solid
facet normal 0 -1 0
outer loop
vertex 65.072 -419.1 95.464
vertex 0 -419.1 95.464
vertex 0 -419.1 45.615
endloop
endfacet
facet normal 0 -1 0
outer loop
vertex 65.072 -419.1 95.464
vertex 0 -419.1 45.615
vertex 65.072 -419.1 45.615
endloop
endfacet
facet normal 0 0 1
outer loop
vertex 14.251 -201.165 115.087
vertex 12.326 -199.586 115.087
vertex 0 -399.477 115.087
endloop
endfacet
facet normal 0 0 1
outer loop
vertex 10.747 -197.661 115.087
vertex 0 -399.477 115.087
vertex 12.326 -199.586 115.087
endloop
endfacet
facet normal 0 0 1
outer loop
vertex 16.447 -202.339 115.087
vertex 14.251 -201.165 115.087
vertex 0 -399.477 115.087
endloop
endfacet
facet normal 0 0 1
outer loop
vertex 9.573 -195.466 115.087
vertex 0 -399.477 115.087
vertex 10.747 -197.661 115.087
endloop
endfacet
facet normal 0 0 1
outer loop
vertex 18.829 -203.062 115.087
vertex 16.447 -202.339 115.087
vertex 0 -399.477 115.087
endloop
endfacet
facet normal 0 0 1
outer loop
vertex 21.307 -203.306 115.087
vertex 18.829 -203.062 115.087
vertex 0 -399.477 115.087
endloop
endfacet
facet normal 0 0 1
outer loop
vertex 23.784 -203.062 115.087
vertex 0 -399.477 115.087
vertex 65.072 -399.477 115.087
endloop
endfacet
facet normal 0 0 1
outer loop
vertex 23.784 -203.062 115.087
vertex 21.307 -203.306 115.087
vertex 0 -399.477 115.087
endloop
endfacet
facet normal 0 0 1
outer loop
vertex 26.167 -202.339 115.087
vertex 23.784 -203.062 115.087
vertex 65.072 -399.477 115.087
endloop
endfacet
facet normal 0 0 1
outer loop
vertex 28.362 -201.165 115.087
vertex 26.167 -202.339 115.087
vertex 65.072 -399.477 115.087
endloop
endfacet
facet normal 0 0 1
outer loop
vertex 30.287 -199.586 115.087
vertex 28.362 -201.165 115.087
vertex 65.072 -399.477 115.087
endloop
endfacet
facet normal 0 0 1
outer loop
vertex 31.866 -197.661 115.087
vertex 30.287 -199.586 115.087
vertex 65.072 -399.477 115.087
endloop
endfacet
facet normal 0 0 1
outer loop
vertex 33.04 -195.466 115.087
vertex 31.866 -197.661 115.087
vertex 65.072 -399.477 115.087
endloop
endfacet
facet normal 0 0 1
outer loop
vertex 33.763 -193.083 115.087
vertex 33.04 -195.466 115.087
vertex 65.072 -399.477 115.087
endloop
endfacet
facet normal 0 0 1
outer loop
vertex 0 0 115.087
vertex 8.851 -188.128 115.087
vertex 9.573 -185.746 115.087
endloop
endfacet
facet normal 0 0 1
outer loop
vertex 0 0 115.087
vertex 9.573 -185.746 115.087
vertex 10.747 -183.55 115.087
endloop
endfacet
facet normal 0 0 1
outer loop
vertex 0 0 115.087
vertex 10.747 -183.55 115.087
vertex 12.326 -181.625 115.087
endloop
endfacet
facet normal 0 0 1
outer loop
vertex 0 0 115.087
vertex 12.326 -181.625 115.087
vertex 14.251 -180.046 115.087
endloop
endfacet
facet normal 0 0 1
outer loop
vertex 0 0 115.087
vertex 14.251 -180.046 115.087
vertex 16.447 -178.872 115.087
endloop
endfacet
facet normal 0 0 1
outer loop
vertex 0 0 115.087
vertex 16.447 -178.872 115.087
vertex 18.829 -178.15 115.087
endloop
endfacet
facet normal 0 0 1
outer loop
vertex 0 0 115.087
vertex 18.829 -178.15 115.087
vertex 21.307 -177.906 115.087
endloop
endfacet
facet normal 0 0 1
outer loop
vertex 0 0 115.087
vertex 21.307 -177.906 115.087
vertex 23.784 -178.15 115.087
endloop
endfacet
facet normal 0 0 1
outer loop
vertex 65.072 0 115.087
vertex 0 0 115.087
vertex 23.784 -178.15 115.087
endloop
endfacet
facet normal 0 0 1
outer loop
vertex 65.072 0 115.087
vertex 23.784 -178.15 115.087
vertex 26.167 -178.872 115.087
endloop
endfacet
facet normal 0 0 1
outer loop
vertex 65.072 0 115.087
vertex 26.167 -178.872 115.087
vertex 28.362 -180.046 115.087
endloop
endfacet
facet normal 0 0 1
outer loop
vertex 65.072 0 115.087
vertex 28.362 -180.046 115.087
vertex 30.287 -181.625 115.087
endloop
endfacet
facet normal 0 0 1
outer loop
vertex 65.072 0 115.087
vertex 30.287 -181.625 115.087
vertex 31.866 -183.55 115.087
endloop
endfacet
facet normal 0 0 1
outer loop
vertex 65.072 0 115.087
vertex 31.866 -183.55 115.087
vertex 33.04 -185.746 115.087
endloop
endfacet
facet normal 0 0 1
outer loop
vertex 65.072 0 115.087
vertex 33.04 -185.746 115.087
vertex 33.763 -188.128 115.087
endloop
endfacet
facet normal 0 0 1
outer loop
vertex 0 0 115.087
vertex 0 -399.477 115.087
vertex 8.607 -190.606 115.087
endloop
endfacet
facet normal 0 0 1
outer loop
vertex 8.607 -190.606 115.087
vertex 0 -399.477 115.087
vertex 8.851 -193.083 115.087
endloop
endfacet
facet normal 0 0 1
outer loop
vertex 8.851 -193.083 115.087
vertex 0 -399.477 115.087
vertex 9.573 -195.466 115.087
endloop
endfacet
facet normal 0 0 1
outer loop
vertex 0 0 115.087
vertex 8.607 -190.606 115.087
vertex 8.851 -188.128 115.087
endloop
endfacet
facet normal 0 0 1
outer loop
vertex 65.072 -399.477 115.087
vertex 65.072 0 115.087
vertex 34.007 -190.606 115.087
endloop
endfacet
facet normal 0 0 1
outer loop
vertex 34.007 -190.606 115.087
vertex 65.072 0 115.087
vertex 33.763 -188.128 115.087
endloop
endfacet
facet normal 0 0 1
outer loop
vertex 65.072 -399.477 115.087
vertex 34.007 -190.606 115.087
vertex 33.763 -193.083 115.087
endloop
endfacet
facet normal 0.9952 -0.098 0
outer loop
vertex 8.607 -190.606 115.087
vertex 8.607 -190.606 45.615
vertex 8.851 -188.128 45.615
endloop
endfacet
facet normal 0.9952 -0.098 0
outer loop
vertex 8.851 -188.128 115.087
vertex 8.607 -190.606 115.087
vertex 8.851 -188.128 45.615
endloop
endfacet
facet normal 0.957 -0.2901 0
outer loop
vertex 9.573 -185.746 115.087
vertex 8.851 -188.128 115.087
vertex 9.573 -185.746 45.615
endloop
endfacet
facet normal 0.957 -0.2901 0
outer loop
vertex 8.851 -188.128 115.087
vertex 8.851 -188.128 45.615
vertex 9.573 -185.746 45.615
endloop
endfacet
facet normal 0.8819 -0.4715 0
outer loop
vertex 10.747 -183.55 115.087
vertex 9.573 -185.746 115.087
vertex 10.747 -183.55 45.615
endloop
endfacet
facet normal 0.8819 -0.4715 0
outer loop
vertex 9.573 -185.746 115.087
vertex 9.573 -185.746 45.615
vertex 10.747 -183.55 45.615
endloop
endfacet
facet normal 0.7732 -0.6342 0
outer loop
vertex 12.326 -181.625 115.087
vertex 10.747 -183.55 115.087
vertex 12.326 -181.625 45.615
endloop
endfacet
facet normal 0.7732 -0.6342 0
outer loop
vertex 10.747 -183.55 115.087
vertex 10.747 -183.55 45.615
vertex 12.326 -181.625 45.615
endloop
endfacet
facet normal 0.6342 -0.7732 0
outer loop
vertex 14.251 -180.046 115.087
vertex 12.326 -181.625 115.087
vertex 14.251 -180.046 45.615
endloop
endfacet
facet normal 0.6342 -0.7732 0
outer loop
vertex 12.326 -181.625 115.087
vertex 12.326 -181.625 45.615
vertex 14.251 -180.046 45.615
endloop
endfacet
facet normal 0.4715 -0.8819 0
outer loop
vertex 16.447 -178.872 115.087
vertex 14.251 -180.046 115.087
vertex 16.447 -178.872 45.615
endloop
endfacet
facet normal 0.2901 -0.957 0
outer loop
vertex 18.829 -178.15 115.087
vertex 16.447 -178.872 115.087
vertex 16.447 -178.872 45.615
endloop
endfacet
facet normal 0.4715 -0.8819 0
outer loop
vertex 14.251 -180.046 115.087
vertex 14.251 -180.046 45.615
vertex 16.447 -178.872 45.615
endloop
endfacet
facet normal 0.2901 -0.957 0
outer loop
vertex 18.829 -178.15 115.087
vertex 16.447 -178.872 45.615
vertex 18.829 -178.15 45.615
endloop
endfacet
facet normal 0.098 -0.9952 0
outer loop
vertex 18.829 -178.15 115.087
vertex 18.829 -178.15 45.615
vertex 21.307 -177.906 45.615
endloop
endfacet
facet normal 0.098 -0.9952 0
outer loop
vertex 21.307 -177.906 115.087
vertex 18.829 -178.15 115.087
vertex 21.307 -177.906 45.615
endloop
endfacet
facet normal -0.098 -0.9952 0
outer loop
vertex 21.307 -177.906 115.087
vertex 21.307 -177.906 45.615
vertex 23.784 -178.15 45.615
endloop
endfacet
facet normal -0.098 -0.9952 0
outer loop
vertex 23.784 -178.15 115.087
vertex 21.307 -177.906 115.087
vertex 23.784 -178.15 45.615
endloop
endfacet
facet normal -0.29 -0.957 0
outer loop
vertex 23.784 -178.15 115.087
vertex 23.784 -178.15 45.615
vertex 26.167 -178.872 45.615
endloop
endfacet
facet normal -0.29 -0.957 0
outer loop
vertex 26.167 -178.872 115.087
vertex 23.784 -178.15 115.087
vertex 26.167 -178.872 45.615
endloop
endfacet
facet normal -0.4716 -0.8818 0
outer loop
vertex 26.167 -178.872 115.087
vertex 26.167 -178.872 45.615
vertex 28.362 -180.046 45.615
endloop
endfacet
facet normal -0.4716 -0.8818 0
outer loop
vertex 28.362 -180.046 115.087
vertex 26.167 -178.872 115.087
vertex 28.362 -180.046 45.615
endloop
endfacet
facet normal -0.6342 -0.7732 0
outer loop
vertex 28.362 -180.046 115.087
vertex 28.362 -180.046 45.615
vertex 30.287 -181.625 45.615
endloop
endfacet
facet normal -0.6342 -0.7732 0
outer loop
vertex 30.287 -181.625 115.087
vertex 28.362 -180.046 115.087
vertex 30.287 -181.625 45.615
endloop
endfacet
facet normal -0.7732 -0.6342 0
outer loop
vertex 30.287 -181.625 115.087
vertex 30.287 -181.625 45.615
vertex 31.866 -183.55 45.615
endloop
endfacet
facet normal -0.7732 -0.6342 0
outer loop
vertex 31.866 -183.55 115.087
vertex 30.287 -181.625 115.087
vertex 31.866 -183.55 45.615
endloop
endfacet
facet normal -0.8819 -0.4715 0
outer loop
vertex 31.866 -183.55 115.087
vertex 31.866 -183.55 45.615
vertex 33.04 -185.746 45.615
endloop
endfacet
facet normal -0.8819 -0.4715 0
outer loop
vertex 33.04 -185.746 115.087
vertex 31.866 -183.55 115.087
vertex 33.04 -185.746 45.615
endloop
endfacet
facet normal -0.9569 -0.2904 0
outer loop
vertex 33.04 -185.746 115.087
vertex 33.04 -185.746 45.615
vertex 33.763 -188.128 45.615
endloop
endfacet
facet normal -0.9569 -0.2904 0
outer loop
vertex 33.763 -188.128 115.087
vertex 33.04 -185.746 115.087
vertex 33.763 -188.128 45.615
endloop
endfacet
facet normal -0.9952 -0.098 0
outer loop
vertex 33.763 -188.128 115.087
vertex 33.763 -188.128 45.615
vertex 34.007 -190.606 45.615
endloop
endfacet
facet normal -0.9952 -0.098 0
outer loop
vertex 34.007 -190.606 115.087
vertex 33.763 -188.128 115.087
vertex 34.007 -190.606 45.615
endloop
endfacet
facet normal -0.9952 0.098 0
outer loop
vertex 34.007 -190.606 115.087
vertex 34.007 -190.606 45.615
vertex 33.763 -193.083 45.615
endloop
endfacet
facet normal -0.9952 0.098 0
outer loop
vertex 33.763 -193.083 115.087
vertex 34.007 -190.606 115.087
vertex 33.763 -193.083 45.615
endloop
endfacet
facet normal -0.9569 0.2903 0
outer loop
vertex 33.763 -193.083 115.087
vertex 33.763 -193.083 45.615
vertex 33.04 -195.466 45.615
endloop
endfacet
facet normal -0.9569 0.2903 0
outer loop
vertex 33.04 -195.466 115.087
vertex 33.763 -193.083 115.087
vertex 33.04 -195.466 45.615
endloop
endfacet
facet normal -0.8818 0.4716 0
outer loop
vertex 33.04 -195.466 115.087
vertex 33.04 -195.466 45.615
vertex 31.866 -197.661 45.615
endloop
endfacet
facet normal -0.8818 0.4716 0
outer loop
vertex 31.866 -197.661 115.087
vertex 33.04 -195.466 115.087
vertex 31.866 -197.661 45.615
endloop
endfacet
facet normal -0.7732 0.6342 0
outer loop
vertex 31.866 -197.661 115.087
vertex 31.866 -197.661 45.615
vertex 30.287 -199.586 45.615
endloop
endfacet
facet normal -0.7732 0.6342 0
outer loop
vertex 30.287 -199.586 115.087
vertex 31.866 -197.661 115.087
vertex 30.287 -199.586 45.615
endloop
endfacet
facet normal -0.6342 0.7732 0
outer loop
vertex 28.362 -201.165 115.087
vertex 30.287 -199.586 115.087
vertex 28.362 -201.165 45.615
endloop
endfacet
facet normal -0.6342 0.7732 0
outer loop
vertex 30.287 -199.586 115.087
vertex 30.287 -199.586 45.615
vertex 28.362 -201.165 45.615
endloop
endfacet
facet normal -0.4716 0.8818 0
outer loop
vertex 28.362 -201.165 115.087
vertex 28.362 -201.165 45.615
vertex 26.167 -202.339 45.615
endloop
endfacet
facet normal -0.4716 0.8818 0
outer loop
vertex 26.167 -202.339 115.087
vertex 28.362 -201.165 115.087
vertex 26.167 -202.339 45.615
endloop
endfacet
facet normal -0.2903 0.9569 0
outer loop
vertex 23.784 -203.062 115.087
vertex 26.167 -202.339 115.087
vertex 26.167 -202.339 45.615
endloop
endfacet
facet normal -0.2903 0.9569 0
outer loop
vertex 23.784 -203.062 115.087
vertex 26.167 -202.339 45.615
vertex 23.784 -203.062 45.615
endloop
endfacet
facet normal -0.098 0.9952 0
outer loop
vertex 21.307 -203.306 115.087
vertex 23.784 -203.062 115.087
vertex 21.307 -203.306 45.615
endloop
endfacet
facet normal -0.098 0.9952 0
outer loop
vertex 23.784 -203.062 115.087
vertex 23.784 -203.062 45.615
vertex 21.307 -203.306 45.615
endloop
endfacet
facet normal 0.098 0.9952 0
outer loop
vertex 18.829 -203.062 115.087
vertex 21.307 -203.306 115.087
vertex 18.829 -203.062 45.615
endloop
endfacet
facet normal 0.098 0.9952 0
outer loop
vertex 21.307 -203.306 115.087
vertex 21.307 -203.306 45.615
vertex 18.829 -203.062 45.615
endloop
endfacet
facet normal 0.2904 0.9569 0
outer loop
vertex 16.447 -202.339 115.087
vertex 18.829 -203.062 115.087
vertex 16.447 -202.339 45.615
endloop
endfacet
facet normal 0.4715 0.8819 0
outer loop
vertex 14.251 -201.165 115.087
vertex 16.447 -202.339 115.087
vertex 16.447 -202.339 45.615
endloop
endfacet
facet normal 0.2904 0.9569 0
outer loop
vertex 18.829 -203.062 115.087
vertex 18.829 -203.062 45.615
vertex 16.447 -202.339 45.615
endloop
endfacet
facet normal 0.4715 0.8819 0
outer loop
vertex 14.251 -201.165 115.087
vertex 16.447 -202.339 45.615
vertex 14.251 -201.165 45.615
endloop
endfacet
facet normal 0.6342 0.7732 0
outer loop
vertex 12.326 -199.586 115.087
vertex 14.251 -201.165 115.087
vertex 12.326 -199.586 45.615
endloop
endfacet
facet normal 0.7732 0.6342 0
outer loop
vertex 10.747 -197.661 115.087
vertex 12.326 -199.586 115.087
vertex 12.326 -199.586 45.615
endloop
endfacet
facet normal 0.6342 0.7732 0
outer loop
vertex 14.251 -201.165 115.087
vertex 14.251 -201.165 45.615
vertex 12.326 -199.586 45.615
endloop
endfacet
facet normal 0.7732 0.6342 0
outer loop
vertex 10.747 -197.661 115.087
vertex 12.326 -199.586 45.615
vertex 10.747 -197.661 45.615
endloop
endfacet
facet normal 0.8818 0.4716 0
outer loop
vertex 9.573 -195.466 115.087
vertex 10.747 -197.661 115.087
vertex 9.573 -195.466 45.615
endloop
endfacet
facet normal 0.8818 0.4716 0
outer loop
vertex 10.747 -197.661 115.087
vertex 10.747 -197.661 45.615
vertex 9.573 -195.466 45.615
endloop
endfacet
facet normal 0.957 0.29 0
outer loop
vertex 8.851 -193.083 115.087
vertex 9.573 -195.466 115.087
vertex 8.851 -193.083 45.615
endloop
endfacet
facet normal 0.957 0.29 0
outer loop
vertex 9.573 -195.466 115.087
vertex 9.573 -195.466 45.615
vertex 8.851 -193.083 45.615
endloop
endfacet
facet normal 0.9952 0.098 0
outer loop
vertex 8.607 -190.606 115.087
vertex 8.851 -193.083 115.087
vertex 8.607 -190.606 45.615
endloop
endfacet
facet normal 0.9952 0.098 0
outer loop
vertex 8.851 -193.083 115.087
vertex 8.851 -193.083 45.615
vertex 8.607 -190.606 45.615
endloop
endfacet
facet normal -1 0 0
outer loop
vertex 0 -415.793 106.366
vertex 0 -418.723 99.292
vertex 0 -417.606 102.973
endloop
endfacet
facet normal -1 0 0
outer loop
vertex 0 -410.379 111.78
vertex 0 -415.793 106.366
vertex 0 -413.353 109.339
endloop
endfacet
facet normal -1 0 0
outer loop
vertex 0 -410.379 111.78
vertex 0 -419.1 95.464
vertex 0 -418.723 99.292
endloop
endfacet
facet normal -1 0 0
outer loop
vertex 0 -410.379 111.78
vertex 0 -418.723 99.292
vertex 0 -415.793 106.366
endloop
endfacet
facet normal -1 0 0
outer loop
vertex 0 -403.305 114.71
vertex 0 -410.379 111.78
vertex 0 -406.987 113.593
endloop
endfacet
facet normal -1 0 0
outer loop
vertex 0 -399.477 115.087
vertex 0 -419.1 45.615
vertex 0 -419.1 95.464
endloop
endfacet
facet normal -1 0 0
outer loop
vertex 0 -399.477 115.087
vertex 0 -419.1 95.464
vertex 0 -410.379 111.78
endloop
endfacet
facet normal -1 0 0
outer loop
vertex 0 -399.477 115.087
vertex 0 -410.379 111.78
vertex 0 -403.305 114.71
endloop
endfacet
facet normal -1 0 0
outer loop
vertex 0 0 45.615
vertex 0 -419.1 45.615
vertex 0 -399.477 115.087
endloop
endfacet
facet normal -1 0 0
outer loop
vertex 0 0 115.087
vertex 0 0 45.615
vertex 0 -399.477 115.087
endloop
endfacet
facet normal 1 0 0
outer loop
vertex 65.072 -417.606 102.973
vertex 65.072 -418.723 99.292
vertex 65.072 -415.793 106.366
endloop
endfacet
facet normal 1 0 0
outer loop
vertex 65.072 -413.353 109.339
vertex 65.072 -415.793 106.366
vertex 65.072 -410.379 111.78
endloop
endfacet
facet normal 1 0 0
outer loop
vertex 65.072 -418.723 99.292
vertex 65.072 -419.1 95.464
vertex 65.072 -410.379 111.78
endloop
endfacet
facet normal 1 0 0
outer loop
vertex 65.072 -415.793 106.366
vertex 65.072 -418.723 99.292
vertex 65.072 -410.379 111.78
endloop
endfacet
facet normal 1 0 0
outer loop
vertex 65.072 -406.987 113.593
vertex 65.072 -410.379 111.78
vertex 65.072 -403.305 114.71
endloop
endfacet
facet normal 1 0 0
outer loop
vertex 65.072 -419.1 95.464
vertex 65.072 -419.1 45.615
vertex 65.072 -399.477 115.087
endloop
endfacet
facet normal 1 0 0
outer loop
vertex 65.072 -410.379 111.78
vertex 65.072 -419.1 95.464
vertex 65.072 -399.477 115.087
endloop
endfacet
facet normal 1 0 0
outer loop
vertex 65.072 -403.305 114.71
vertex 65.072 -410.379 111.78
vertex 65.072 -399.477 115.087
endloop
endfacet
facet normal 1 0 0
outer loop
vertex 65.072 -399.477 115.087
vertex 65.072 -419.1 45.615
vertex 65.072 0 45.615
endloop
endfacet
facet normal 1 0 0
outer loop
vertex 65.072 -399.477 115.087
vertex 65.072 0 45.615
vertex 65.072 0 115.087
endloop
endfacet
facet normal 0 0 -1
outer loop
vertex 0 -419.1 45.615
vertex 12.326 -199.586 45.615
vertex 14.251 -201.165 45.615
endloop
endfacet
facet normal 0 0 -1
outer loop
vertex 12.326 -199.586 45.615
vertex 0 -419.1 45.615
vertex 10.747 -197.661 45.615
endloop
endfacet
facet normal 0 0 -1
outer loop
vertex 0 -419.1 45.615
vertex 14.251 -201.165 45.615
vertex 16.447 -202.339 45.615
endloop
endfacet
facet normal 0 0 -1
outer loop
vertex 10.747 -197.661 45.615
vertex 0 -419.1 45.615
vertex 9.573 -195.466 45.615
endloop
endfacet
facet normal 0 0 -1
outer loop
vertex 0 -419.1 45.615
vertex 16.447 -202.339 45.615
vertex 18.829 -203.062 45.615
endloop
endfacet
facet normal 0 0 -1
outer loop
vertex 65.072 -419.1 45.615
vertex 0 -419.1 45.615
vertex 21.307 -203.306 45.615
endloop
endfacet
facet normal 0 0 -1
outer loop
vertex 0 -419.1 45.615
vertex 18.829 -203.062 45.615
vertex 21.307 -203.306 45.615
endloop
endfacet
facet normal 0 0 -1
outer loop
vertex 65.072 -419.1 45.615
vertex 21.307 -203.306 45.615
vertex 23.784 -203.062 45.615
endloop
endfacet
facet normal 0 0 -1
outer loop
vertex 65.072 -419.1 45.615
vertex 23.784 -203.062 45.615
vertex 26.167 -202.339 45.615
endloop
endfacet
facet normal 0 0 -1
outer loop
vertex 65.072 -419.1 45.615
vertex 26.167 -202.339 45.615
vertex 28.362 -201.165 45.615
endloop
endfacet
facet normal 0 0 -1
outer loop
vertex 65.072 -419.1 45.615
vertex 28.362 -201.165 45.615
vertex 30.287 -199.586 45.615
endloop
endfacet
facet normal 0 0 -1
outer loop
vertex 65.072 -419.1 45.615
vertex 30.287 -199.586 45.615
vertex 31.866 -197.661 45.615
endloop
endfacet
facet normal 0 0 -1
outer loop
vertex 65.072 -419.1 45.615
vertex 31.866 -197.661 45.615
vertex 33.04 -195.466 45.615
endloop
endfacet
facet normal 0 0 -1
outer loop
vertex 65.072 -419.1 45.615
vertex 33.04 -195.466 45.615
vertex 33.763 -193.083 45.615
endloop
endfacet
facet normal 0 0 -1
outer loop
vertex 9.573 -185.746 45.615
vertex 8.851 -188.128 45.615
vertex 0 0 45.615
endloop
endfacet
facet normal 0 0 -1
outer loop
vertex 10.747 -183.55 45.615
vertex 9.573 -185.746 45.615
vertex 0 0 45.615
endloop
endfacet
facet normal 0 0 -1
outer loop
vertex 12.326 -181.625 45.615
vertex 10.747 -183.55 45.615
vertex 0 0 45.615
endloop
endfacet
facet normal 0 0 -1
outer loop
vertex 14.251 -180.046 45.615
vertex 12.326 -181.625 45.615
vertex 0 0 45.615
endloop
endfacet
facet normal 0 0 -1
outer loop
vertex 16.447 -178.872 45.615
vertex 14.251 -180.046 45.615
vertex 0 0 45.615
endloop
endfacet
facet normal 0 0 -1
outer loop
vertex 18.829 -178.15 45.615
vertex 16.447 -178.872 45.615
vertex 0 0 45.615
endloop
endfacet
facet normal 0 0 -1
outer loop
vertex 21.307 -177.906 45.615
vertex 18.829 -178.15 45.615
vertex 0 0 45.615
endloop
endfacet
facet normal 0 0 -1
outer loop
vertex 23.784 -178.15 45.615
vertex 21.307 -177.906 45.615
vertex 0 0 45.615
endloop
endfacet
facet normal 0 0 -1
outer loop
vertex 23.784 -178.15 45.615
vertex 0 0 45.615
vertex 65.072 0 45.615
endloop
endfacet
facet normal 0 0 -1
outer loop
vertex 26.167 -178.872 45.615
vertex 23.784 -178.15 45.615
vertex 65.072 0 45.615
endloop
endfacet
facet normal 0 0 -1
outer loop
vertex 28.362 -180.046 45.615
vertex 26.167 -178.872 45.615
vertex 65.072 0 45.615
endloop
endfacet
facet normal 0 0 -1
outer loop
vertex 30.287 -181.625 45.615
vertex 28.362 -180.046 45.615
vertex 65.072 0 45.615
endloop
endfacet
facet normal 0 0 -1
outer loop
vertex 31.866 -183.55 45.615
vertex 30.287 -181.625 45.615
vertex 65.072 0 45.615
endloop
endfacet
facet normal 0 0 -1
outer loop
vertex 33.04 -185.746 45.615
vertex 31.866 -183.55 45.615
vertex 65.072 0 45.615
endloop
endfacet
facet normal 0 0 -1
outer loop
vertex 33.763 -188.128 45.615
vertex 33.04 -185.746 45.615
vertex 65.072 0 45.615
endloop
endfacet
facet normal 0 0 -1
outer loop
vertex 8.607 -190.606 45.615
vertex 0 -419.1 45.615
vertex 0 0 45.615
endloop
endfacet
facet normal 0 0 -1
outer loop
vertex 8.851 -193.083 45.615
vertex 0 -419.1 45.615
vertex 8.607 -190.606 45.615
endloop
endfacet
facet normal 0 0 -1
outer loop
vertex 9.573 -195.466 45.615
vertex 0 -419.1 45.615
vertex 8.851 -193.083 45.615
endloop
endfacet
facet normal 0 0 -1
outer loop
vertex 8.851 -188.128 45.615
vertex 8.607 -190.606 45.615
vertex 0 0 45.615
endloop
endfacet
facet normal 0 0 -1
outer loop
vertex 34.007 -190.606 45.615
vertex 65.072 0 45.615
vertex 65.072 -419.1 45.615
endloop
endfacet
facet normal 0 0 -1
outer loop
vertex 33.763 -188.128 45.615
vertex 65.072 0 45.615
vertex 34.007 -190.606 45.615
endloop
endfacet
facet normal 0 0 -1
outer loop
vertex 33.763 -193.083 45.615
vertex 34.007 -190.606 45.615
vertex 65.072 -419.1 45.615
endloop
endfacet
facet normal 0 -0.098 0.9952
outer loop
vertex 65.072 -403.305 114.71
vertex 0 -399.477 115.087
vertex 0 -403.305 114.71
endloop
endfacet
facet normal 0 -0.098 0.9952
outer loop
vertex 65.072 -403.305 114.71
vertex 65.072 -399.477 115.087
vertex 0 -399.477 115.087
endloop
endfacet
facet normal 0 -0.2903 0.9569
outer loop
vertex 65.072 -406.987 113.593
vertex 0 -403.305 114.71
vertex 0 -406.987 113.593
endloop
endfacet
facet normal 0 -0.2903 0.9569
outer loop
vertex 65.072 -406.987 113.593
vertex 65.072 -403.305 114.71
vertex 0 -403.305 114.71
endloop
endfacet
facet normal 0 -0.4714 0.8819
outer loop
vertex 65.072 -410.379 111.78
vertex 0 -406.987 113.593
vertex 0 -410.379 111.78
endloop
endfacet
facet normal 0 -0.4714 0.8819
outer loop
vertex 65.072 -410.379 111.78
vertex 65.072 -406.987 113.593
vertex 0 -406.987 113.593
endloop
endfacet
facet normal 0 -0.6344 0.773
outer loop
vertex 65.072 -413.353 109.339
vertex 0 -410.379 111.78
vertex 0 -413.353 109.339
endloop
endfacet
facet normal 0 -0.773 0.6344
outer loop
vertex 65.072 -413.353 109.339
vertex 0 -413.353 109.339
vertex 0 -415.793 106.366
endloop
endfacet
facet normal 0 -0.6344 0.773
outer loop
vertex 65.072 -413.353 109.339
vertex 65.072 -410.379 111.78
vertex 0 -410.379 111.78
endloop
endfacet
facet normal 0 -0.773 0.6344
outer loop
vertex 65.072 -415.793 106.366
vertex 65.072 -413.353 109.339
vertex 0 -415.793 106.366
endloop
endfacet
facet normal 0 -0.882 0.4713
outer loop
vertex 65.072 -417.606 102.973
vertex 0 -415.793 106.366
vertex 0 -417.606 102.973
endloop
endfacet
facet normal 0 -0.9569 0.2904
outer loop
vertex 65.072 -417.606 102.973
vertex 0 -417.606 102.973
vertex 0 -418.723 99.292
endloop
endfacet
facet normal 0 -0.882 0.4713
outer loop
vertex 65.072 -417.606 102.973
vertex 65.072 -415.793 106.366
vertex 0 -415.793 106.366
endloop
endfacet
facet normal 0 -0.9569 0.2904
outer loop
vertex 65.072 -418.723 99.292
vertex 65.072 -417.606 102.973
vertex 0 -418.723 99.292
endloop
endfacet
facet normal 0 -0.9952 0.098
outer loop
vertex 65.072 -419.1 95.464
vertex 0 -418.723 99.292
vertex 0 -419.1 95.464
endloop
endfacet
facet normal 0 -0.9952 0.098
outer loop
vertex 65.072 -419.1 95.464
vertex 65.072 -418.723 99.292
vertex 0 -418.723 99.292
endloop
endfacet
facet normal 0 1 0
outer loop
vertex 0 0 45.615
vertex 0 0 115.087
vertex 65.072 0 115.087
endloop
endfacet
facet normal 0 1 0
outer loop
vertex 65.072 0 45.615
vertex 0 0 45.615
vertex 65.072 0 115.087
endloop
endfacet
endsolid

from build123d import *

# Parameters (mm, degrees)
F0_W     = 65.071911
F0_H     = 69.471795
F1_DEPTH = 419.1
F2_R     = 19.622728
F4_D     = 25.4


with BuildPart() as f1:
    # F0 (on Front) → F1 (new body)
    with BuildSketch(Plane.XZ):
        with Locations((32.535956, 80.350911)):
            Rectangle(F0_W, F0_H)
    extrude(amount=F1_DEPTH)

    # F2
    f2_edges = [f1.edges().sort_by_distance(p)[0] for p in [
        (32.535955, -419.1, 115.086809),
    ]]
    fillet(f2_edges, radius=F2_R)

    # F4 (through all)
    with Locations(Plane.XY.offset(115.086809)):
        with Locations((21.306643, -190.605685)):
            Hole(F4_D / 2)


solid = f1.part
